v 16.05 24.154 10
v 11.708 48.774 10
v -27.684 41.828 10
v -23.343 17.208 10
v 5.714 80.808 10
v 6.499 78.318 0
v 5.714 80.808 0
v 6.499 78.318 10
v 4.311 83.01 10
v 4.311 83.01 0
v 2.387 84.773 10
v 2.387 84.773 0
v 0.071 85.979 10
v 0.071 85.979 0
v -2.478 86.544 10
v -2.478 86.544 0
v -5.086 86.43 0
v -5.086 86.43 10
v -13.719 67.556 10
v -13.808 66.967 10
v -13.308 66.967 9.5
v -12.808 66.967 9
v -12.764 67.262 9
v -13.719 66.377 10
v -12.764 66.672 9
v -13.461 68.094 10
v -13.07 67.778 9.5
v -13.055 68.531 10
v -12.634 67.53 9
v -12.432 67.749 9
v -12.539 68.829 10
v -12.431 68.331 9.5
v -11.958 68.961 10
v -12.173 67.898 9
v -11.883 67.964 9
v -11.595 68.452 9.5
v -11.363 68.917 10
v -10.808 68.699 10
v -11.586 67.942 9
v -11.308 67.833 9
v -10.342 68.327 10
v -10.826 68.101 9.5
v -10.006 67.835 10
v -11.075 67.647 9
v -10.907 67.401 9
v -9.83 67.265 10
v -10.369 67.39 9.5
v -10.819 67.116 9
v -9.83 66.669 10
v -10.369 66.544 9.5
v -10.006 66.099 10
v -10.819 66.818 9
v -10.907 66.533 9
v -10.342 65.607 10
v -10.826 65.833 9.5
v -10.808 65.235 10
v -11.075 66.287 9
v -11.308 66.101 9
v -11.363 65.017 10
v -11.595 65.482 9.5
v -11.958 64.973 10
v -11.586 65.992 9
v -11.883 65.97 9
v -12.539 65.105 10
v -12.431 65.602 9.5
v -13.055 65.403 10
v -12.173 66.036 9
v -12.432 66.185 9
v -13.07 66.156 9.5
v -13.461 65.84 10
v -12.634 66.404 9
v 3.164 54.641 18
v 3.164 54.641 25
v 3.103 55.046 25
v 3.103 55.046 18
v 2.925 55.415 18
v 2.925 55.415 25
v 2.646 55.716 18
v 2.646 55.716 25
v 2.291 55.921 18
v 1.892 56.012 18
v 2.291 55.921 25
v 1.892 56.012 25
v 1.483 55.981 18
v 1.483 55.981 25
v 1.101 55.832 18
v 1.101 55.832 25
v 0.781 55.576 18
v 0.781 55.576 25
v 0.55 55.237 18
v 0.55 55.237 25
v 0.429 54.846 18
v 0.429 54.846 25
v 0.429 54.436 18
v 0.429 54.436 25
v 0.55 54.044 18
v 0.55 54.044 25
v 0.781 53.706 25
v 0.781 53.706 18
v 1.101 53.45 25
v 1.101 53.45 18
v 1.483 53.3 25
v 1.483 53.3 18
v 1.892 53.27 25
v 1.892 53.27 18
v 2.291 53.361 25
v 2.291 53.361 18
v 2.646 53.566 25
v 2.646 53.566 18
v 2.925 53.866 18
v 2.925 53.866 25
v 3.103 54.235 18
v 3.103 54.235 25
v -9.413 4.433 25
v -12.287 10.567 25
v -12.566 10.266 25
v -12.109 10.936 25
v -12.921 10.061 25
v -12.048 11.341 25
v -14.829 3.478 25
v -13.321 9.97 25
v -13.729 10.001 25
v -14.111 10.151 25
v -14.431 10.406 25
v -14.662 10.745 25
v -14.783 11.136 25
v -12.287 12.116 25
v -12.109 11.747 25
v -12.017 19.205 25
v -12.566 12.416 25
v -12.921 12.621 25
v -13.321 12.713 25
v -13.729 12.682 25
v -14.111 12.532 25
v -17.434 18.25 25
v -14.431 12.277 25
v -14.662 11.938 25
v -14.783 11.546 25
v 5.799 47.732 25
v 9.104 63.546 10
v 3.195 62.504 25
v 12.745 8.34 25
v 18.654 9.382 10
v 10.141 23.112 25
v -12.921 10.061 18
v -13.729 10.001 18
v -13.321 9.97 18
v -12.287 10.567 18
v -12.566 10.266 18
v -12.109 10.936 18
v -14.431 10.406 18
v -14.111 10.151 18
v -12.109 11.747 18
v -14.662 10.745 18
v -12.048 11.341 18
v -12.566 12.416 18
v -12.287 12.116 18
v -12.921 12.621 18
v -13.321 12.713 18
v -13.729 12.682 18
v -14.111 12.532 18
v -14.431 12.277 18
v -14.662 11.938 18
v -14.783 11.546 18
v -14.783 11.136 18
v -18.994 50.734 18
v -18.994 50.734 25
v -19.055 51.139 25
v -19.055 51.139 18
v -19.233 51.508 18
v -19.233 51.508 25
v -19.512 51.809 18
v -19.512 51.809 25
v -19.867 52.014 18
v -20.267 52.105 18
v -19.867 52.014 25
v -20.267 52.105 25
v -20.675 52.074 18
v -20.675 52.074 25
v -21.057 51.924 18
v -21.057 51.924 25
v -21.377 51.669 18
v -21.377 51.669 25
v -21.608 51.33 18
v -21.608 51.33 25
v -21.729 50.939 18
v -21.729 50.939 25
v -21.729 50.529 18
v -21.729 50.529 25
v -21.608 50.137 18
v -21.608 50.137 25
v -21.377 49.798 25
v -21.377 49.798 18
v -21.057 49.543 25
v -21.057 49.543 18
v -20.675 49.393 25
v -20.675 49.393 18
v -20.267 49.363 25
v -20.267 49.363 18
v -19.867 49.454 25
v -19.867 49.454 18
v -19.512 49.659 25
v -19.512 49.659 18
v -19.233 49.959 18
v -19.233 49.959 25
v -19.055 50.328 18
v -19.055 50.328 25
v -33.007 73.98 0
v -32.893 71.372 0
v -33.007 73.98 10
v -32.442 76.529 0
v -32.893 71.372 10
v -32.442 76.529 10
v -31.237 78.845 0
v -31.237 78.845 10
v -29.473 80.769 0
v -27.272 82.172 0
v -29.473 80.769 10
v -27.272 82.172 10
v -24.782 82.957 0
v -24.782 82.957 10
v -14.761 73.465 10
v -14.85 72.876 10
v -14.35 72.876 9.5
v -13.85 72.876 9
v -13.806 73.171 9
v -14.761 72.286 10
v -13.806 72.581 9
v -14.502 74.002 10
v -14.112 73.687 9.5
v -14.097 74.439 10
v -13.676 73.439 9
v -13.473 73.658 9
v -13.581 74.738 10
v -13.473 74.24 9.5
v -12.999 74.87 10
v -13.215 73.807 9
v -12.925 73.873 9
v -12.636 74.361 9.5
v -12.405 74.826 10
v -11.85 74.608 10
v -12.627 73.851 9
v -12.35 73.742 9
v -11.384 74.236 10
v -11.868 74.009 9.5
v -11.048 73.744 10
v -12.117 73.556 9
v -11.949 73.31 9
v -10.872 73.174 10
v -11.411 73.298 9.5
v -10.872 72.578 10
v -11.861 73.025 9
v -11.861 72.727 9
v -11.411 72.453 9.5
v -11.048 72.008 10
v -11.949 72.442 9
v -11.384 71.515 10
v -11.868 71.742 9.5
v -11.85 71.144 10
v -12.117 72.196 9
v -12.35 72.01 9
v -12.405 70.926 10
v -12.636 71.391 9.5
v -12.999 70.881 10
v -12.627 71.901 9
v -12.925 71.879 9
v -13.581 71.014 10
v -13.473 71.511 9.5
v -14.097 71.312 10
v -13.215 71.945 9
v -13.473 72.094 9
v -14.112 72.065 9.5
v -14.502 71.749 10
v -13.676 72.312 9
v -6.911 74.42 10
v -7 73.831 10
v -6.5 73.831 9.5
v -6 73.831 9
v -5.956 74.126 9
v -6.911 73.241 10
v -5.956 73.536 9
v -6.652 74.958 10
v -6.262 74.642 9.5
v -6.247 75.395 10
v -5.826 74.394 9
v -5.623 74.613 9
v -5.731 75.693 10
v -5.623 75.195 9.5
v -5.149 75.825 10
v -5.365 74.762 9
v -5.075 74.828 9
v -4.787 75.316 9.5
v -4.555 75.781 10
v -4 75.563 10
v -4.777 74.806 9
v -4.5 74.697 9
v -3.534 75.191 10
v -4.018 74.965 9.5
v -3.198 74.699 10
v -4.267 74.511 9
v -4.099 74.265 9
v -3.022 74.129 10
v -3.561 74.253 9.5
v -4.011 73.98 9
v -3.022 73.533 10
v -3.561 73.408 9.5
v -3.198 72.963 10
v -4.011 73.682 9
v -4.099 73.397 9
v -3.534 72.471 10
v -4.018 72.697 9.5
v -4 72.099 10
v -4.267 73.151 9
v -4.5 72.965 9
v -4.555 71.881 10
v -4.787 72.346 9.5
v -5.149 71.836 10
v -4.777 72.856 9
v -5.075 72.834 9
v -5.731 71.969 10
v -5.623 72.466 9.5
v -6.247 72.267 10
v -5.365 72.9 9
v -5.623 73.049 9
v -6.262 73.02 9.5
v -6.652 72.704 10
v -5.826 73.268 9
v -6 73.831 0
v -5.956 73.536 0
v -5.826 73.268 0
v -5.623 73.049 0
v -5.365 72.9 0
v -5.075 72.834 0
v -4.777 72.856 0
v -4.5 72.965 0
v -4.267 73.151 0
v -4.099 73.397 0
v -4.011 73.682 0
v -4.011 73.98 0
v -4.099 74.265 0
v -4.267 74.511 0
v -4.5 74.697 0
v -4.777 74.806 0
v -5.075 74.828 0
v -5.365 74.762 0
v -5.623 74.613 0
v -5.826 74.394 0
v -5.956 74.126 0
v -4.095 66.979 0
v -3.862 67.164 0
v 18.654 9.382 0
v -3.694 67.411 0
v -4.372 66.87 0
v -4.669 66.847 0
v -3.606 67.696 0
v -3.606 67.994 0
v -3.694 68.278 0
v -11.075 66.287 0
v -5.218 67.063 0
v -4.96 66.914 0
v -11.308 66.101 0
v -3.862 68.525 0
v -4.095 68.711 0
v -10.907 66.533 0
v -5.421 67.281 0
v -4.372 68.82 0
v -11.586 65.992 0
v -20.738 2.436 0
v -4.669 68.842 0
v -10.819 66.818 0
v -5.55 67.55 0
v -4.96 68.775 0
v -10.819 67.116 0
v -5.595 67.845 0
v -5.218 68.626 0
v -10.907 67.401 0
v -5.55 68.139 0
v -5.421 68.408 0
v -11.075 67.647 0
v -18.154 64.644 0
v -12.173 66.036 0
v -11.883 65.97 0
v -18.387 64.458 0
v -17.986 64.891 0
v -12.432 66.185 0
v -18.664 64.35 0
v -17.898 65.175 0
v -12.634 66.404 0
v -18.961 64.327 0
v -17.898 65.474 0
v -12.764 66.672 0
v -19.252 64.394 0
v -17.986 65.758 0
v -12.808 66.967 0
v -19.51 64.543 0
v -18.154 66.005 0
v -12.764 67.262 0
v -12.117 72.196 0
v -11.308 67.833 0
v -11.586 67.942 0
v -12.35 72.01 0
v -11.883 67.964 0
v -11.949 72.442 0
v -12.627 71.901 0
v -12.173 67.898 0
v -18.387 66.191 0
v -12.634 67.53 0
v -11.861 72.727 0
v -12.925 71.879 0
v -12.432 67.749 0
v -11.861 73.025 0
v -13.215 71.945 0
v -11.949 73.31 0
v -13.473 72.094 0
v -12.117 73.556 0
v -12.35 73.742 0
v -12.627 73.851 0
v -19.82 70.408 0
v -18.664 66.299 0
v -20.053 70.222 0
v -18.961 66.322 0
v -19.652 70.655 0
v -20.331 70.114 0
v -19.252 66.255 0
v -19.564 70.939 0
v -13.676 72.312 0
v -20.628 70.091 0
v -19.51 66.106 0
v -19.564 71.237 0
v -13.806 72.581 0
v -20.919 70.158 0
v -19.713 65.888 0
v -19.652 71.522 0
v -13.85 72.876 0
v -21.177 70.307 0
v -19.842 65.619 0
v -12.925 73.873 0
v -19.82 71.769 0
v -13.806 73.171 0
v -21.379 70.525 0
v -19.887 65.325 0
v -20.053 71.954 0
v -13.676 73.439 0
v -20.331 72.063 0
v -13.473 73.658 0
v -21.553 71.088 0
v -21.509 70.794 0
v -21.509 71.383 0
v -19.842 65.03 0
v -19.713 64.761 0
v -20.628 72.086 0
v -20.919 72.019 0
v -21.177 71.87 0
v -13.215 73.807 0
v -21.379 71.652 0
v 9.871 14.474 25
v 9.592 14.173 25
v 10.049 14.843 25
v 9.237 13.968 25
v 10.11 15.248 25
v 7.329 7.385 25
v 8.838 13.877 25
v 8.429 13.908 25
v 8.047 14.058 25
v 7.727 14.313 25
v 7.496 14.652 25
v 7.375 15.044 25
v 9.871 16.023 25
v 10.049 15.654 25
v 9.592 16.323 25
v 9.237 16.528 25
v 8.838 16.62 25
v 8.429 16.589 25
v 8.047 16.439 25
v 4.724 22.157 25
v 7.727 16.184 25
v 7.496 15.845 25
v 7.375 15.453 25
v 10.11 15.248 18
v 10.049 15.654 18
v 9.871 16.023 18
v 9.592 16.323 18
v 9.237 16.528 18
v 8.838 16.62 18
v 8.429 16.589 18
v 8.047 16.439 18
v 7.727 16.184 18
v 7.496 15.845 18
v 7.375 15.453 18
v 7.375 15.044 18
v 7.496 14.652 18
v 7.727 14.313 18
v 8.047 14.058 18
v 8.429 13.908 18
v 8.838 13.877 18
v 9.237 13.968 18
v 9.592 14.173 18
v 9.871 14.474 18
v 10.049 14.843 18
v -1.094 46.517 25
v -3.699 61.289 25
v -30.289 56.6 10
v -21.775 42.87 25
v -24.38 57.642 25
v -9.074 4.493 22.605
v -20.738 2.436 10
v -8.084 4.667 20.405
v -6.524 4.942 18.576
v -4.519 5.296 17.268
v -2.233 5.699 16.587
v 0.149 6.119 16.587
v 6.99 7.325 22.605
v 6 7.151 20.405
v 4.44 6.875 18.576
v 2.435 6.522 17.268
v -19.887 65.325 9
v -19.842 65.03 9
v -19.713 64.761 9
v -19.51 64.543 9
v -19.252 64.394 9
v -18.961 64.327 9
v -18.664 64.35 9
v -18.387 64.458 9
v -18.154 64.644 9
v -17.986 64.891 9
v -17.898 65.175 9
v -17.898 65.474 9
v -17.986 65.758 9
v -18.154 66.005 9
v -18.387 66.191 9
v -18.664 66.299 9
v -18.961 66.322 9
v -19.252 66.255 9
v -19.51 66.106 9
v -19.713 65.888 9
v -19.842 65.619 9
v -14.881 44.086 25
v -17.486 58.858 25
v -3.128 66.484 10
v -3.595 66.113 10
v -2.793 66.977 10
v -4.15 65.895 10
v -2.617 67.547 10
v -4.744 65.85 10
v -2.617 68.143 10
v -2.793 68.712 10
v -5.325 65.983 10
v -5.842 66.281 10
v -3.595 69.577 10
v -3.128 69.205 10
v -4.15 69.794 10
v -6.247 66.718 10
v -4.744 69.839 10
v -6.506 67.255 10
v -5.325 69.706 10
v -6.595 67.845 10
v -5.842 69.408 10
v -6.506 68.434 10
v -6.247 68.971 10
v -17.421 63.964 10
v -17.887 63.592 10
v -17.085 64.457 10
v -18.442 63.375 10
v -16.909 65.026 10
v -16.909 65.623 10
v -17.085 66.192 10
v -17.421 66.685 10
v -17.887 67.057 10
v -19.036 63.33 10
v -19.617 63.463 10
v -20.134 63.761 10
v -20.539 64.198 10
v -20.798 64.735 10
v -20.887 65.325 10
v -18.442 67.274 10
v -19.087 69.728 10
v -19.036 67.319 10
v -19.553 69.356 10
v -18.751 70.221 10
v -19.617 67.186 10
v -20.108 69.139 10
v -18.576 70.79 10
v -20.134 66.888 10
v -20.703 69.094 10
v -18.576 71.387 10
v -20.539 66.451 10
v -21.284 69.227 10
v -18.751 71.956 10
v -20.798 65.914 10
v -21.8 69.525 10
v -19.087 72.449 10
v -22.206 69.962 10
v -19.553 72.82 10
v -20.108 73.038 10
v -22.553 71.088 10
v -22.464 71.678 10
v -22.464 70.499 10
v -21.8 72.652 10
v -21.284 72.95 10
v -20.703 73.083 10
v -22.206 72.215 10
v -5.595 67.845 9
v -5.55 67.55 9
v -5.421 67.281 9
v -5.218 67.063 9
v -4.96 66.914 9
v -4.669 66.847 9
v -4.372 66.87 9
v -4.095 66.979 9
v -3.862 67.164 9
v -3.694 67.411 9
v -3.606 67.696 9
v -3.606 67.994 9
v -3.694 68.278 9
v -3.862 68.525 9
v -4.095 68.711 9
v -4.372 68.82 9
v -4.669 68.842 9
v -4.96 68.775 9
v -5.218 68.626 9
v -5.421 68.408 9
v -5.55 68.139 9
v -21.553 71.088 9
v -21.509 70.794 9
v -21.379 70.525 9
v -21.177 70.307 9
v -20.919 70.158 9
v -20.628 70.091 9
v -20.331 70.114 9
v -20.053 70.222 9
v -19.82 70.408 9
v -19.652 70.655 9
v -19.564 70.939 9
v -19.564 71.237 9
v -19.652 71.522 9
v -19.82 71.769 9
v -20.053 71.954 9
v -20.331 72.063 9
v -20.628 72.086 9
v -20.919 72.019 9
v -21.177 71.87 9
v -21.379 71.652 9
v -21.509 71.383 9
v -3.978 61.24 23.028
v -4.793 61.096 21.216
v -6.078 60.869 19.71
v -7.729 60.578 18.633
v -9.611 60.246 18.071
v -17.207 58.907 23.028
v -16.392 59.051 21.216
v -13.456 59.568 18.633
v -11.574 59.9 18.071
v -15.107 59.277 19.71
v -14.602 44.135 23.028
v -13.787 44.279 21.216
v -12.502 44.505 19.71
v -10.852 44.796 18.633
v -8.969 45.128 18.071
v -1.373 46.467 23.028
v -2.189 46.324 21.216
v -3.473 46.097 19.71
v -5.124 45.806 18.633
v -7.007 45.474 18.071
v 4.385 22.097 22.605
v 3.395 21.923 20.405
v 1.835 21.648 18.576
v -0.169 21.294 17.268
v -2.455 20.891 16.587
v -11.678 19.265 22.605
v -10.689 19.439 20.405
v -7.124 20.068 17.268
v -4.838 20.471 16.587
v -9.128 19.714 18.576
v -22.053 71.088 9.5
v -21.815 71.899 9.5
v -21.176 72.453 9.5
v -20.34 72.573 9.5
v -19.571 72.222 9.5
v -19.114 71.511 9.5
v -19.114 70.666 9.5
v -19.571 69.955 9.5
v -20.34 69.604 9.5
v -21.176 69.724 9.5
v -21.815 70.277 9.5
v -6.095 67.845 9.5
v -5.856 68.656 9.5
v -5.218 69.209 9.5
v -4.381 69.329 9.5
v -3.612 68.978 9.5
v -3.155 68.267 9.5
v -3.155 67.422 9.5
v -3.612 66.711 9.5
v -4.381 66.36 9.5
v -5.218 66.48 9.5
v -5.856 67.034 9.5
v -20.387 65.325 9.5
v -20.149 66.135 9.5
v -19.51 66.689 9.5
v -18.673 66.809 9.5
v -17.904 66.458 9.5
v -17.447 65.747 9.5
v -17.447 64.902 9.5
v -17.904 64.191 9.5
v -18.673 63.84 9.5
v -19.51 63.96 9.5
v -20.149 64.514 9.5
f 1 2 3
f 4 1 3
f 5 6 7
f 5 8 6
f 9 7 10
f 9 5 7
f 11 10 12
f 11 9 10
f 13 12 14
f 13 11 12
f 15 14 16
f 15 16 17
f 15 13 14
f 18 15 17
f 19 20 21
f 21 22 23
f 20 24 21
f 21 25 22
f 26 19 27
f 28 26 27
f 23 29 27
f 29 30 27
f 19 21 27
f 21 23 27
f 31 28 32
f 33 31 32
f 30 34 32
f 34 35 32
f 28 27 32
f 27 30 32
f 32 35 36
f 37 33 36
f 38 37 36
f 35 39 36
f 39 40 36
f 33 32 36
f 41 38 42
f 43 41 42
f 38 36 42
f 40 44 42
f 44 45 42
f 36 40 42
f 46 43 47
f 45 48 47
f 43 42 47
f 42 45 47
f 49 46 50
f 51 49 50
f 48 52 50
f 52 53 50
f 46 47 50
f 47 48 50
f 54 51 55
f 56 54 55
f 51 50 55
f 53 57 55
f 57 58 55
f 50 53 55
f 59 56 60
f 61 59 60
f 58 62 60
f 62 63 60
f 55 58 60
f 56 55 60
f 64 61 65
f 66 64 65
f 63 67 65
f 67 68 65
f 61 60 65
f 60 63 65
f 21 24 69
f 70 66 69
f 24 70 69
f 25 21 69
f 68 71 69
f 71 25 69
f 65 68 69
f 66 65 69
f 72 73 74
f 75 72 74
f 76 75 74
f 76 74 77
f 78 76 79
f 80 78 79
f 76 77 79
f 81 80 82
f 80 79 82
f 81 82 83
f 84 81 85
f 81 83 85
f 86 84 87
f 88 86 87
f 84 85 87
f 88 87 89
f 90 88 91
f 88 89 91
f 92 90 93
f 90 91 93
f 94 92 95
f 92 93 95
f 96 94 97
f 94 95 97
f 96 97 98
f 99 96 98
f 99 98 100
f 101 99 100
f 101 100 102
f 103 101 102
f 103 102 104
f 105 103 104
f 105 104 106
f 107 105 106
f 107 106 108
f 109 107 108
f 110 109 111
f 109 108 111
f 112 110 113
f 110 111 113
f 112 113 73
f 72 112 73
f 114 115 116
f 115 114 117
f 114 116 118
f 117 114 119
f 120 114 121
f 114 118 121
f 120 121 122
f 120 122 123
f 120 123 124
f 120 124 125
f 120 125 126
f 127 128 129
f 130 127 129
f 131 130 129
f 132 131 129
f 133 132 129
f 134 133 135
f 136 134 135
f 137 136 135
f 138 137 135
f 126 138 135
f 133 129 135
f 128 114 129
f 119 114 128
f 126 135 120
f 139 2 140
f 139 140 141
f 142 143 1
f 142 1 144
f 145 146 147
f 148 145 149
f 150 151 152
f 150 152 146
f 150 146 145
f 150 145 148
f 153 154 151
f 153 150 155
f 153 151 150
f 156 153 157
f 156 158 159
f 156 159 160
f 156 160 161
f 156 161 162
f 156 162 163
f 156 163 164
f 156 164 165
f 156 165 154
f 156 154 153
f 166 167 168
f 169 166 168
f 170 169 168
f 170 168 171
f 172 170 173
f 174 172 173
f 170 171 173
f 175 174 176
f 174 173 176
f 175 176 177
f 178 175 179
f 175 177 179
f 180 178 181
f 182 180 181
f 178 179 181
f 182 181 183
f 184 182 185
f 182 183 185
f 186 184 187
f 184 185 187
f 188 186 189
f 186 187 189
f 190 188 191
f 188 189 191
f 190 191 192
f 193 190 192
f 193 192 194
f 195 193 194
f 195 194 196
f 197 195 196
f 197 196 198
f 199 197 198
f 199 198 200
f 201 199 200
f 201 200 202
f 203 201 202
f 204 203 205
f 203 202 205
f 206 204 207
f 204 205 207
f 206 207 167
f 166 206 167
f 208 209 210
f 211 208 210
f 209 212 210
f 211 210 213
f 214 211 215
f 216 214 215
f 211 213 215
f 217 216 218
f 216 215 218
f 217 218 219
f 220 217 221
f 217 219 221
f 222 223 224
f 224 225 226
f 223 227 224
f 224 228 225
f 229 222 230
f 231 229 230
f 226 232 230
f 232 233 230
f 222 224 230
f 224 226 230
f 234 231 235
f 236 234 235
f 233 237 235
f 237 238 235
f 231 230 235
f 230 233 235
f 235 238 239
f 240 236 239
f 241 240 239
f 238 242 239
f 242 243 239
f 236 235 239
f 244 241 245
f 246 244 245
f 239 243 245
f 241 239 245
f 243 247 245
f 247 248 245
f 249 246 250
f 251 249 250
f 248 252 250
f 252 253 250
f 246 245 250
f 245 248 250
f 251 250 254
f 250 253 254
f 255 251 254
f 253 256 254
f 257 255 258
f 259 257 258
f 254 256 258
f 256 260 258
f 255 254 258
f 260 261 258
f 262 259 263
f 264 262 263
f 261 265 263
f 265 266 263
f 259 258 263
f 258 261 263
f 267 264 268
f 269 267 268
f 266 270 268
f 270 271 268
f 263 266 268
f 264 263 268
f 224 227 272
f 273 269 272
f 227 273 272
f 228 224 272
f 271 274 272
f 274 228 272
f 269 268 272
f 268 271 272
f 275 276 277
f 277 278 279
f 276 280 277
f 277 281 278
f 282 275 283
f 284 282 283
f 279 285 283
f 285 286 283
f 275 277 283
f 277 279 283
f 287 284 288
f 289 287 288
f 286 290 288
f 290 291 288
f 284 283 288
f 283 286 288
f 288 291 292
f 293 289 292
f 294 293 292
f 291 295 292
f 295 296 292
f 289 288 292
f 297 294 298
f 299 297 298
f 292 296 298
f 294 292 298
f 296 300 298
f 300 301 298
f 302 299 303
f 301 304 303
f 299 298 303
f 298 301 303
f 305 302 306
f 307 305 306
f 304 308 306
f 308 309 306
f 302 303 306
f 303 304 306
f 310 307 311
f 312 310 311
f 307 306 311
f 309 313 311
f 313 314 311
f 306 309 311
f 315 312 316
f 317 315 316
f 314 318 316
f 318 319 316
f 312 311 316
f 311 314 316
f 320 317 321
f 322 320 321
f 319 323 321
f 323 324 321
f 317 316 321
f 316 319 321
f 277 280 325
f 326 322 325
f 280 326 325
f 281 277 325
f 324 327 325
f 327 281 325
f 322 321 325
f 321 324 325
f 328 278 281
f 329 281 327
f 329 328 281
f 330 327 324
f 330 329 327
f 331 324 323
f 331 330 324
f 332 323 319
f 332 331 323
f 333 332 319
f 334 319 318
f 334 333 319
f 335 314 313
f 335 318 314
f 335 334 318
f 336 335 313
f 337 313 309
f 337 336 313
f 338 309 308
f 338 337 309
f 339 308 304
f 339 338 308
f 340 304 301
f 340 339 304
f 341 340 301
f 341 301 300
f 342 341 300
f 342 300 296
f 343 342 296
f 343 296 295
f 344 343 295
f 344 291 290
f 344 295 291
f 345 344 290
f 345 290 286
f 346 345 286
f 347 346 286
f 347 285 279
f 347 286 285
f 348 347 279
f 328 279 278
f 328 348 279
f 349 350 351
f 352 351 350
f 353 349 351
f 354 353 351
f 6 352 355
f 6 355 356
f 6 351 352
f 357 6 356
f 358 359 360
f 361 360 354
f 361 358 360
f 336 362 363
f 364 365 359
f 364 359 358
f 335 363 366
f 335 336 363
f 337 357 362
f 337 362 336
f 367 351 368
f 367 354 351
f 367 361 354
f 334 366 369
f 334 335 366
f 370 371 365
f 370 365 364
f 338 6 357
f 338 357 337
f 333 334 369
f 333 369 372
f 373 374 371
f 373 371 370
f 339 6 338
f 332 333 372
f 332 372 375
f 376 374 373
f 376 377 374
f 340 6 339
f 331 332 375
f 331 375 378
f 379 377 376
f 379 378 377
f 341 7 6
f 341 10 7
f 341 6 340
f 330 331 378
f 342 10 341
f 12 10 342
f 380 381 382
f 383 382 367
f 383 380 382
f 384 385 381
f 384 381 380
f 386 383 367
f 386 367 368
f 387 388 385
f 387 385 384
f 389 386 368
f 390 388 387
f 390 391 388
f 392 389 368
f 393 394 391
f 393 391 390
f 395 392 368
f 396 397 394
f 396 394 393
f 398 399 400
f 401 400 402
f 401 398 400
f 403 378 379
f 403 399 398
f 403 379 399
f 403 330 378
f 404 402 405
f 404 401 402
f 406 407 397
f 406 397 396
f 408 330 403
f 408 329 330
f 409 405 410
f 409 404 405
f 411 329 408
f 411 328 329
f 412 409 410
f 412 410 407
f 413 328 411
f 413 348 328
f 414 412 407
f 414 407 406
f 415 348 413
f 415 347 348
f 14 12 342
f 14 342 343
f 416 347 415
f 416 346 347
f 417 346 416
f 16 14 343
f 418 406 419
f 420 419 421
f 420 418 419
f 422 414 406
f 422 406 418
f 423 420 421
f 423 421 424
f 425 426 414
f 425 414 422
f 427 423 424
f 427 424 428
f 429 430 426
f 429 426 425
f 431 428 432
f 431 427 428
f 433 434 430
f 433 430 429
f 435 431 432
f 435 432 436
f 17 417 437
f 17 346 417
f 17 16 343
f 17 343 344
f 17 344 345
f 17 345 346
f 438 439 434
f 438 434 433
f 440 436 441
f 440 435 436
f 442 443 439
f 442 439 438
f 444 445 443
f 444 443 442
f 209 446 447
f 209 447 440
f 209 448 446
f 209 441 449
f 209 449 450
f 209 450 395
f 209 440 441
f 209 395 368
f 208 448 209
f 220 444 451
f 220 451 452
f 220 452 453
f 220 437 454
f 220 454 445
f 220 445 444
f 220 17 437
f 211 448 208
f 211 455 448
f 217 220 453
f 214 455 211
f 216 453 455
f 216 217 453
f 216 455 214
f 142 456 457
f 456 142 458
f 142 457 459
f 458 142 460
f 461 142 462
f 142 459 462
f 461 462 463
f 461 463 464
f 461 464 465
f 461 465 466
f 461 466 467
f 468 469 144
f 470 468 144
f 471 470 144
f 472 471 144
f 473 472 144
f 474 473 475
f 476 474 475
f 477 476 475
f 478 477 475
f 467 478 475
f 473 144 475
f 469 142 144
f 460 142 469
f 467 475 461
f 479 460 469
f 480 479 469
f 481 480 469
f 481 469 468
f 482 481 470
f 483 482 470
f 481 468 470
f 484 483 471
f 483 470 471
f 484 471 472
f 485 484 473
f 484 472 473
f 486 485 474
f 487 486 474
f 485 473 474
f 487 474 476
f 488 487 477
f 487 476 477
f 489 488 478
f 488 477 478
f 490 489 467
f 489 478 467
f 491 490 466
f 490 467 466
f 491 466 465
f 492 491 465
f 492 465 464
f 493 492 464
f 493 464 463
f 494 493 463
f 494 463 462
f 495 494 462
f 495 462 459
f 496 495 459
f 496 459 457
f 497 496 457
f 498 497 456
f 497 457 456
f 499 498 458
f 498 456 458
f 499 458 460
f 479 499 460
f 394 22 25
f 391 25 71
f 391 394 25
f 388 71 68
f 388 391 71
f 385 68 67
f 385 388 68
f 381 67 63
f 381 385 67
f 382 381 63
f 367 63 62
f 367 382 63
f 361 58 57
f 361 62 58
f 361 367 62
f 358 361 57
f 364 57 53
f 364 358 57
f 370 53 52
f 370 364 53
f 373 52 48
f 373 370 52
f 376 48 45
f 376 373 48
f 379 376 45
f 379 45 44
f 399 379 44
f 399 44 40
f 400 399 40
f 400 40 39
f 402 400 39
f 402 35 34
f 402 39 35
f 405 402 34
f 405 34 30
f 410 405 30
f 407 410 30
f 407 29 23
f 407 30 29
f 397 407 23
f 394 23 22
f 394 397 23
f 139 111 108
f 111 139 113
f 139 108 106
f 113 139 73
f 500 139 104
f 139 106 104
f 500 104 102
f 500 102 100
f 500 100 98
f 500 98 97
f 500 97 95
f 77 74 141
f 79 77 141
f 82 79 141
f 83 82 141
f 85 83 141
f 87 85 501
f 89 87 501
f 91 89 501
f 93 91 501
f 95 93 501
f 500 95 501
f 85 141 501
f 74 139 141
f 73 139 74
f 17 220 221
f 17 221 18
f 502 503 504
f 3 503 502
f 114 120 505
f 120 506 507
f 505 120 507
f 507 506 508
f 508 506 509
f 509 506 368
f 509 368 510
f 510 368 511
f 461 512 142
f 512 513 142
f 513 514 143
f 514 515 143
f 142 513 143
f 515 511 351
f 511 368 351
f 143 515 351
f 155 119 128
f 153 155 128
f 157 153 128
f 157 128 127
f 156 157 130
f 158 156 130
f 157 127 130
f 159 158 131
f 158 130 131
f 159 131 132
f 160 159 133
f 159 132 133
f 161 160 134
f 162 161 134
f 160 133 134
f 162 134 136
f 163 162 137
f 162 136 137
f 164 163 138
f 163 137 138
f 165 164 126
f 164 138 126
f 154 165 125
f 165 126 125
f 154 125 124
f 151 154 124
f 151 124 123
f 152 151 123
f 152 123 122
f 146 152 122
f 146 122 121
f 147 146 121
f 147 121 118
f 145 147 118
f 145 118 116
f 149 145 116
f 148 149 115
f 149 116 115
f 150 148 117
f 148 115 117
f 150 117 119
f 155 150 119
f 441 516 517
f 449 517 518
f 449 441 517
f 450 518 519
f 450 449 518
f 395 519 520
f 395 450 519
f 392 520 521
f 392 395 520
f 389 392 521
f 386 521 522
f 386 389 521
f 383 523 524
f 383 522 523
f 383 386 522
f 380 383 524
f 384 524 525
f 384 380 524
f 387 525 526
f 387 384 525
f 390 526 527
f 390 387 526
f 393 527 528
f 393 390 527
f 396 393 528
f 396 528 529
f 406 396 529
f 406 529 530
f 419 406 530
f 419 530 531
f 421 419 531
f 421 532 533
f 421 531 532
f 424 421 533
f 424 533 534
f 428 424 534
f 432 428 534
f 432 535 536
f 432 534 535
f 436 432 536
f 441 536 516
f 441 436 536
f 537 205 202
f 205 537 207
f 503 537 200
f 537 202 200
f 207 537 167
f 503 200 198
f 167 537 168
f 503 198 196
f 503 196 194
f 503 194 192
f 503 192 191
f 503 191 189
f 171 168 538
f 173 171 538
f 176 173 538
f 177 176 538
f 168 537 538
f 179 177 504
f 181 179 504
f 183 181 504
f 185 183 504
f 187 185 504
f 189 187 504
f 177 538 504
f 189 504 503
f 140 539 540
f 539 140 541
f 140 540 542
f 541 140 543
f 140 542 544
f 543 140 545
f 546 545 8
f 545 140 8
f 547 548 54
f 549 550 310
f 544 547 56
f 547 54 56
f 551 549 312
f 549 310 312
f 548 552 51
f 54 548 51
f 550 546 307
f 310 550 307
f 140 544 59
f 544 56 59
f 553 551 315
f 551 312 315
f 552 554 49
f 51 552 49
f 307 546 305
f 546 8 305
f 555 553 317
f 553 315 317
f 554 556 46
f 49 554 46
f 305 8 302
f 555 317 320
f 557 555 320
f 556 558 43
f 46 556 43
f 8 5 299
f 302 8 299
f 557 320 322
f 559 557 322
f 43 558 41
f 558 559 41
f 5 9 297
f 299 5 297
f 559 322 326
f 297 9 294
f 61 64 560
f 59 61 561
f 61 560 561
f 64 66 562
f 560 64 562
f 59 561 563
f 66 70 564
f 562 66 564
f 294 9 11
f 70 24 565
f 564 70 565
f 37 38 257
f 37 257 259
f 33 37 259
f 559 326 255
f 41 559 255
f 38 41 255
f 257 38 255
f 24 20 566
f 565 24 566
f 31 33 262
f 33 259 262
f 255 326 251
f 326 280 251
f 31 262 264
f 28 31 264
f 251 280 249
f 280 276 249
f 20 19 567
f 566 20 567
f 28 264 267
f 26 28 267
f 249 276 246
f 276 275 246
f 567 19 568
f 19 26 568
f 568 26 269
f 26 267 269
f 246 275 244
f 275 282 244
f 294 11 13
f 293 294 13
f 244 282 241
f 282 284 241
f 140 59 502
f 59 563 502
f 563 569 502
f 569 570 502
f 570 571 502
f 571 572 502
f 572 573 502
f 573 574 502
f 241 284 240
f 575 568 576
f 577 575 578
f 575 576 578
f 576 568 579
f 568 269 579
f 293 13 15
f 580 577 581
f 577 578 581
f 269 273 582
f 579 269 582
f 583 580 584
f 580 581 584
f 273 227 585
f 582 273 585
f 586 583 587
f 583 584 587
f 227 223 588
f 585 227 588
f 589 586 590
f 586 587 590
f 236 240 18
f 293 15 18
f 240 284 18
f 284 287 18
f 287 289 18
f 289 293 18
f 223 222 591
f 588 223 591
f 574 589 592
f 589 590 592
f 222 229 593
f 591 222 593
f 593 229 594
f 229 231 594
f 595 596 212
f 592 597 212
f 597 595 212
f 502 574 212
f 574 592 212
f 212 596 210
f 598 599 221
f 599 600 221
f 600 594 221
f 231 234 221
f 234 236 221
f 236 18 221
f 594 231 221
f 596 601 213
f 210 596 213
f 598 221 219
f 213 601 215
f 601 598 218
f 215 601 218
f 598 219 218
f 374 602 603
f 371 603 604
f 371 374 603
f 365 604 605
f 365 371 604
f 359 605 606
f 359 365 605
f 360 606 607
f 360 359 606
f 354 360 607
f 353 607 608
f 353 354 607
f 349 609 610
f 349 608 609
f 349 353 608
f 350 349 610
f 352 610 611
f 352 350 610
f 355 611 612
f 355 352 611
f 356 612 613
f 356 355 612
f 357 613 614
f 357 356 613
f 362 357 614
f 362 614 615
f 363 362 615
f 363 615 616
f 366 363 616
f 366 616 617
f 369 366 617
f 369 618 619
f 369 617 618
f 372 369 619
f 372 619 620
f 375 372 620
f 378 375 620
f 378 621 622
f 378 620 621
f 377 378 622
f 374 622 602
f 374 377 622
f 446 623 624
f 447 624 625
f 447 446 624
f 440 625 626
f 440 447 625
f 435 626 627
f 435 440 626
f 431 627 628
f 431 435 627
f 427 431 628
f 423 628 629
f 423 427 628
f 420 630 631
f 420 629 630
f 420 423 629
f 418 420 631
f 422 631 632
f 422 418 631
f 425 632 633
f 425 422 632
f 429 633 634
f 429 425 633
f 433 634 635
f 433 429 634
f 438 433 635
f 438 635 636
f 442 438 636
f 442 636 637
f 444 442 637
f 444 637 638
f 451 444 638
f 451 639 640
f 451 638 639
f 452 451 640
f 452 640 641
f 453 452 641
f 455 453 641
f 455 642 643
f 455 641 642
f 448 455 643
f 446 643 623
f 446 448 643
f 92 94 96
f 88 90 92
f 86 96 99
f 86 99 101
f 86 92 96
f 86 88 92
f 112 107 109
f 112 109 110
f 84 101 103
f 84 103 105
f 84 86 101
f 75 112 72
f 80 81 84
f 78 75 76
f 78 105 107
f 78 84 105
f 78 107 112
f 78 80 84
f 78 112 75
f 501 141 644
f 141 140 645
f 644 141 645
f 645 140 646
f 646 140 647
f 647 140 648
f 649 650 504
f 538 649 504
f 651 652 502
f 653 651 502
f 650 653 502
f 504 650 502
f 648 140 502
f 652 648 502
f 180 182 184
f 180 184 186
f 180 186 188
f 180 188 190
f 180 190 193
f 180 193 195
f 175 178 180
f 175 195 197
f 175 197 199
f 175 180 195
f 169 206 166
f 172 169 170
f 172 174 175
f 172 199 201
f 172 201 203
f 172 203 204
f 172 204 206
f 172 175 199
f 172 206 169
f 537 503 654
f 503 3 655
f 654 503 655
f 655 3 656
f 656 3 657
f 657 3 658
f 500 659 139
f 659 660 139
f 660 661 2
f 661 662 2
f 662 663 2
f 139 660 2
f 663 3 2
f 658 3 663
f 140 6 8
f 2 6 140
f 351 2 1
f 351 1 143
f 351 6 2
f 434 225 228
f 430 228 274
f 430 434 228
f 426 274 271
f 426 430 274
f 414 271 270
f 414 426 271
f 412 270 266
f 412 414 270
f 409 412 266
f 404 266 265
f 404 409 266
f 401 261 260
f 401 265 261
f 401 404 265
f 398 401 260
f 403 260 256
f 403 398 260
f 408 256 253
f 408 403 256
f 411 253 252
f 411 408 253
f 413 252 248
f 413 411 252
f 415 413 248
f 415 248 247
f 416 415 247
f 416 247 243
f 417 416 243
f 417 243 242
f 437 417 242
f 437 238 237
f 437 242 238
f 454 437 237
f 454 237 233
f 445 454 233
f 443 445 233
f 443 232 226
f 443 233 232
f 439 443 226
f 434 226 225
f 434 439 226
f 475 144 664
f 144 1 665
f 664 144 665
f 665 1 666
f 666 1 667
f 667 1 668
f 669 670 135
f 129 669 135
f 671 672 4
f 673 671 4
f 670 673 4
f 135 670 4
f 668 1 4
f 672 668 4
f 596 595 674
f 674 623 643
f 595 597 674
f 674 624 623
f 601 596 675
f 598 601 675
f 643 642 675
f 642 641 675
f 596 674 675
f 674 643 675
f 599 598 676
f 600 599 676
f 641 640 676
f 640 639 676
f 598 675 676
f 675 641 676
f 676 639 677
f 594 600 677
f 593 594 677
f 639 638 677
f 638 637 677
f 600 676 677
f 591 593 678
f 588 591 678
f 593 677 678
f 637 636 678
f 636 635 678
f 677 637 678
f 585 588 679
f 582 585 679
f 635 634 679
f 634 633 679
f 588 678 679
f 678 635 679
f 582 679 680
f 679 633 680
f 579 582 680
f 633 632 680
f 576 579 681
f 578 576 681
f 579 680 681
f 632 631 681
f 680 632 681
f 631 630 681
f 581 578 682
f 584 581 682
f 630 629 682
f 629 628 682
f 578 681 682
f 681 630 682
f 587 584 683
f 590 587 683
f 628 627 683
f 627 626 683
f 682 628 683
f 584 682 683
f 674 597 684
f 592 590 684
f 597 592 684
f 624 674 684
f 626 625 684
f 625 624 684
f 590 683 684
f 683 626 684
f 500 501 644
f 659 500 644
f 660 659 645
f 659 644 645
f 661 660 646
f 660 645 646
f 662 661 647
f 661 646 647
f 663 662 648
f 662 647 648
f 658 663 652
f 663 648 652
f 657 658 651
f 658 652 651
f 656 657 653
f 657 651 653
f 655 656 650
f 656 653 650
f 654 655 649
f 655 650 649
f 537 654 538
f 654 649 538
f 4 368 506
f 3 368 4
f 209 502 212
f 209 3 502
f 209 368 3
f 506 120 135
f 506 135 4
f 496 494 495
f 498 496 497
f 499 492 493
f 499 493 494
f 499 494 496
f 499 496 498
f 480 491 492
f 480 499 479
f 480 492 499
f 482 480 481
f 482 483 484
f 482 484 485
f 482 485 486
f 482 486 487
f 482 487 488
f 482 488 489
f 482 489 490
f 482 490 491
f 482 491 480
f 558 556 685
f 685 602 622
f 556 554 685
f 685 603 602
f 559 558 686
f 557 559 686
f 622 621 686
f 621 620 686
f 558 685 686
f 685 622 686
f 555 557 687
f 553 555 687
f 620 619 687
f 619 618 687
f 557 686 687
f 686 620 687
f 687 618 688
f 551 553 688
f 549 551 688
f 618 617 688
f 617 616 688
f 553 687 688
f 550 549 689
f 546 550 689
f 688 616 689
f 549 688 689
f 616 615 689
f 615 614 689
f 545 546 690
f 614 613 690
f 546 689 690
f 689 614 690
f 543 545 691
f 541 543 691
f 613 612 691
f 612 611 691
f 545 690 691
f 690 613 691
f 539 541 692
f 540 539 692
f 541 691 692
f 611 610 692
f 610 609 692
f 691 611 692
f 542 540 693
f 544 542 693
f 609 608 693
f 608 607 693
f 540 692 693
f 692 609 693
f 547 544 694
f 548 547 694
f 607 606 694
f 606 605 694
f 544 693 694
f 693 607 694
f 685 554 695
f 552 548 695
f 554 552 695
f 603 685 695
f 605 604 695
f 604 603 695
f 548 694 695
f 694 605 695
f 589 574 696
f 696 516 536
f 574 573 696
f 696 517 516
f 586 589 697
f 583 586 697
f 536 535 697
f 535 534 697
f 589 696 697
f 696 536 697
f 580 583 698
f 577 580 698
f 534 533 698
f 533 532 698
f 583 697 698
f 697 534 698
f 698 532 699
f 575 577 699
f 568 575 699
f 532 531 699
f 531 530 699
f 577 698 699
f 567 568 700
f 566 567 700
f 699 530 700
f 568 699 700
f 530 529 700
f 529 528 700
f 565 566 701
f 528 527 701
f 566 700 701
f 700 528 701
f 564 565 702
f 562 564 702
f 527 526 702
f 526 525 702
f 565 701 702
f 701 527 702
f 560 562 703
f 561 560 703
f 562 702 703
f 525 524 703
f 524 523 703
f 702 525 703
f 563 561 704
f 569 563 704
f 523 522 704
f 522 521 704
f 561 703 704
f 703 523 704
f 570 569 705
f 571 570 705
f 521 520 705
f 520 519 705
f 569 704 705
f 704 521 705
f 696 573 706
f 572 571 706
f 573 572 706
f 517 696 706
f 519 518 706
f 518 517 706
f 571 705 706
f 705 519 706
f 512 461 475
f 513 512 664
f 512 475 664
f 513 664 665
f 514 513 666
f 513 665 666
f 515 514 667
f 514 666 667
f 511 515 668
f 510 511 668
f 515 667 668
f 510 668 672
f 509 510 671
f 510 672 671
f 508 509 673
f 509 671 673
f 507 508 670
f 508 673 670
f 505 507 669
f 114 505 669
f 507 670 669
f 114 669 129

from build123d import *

# Parameters (mm, degrees)
BOSS_EXTRUDE7_DEPTH     = 10
SKETCH1_9_R             = 1
CUT_EXTRUDE4_DEPTH      = 19
CHAMFER1_SIZE           = 1
BOSS_EXTRUDE8_DEPTH     = 30
CUT_EXTRUDE7_DEPTH      = 42
CUT_EXTRUDE7_DEPTH_BACK = 39
CUT_EXTRUDE8_DEPTH      = 24
CUT_EXTRUDE9_DEPTH      = 24
SKETCH10_R              = 1.375
CUT_EXTRUDE10_DEPTH     = 7
FILLET1_R               = 10


with BuildPart() as part:
    # Sketch1 → Boss-Extrude7 (new body)
    with BuildSketch(Plane.XY):
        Polygon((-34.62989834, 81.220503206), (4.762411781, 88.166430312), (18.654265994, 9.381810071), (-20.738044126, 2.435882965), align=None)
    extrude(amount=BOSS_EXTRUDE7_DEPTH)

    # Sketch1<9> → Cut-Extrude4 (cut)
    with BuildSketch(Plane.XY):
        with Locations((-20.553187739, 71.088441211)):
            Circle(SKETCH1_9_R)
        with Locations((-5, 73.830887845)):
            Circle(SKETCH1_9_R)
        with Locations((-18.886713057, 65.324513545)):
            Circle(SKETCH1_9_R)
        with Locations((-4.594594595, 67.844599641)):
            Circle(SKETCH1_9_R)
        with Locations((-12.849965147, 72.875773723)):
            Circle(SKETCH1_9_R)
        with Locations((-11.808076081, 66.966927205)):
            Circle(SKETCH1_9_R)
    extrude(amount=CUT_EXTRUDE4_DEPTH, mode=Mode.SUBTRACT)

    # Chamfer1
    chamfer1_edges = [part.edges().sort_by_distance(p)[0] for p in [
        (-19.886713057, 65.324513545, 10),
        (-5.594594595, 67.844599641, 10),
        (-6, 73.830887845, 10),
        (-21.553187739, 71.088441211, 10),
        (-12.808076081, 66.966927205, 10),
        (-13.849965147, 72.875773723, 10),
    ]]
    chamfer(chamfer1_edges, length=CHAMFER1_SIZE)

    # Sketch6 → Boss-Extrude8 (add)
    with BuildSketch(Plane.XY.offset(10)):
        Polygon((16.049543329, 24.153926367), (-23.342766791, 17.20799926), (-20.738044126, 2.435882965), (18.654265994, 9.381810071), align=None)
        Polygon((-30.288693898, 56.60030938), (-27.683971233, 41.828193085), (11.708338888, 48.774120192), (9.103616223, 63.546236487), align=None)
    extrude(amount=BOSS_EXTRUDE8_DEPTH)

    # Sketch8 → Cut-Extrude7 (cut, two sides: drawn at the far end of the back side and taken through both)
    with BuildSketch(Plane(origin=(-3.646611731, 20.680962813, 0), x_dir=(0.984807753012227, 0.1736481776668232, 0), z_dir=(-0.1736481776668232, 0.984807753012227, 0)).offset(-CUT_EXTRUDE7_DEPTH_BACK)):
        Polygon((-14, -40), (-14, -25), (-20, -10), (-20, -40), align=None)
        Polygon((20, -10), (14, -25), (14, -40), (20, -40), align=None)
    extrude(amount=CUT_EXTRUDE7_DEPTH + CUT_EXTRUDE7_DEPTH_BACK, mode=Mode.SUBTRACT)

    # Sketch8<4> → Cut-Extrude8 (cut)
    with BuildSketch(Plane(origin=(-3.646611731, 20.680962813, 0), x_dir=(0.984807753012227, 0.1736481776668232, 0), z_dir=(-0.1736481776668232, 0.984807753012227, 0))):
        with BuildLine():
            Line((14, -25), (8.5, -25))
            ThreePointArc((8.5, -25), (0, -16.5), (-8.5, -25))
            Line((-8.5, -25), (-14, -25))
            Line((-14, -25), (-14, -40))
            Line((-14, -40), (14, -40))
            Line((14, -40), (14, -25))
        make_face()
    extrude(amount=-CUT_EXTRUDE8_DEPTH, mode=Mode.SUBTRACT)

    # Sketch7 → Cut-Extrude9 (cut)
    with BuildSketch(Plane(origin=(-10.592538838, 60.073272934, 0), x_dir=(0.984807753012227, 0.17364817766682317, 0), z_dir=(-0.17364817766682317, 0.984807753012227, 0))):
        with BuildLine():
            Line((20, -40), (20, -10))
            Line((20, -10), (14, -25))
            Line((14, -25), (7, -25))
            ThreePointArc((7, -25), (0, -18), (-7, -25))
            Line((-7, -25), (-14, -25))
            Line((-14, -25), (-20, -10))
            Line((-20, -10), (-20, -40))
            Line((-20, -40), (20, -40))
        make_face()
    extrude(amount=-CUT_EXTRUDE9_DEPTH, mode=Mode.SUBTRACT)

    # Sketch10 → Cut-Extrude10 (cut)
    with BuildSketch(Plane.XY.offset(25)):
        with Locations((-13.42333762, 11.341362667)):
            Circle(SKETCH10_R)
        with Locations((8.734836823, 15.248446664)):
            Circle(SKETCH10_R)
        with Locations((-20.369264727, 50.733672787)):
            Circle(SKETCH10_R)
        with Locations((1.788909716, 54.640756785)):
            Circle(SKETCH10_R)
    extrude(amount=-CUT_EXTRUDE10_DEPTH, mode=Mode.SUBTRACT)

    # Fillet1
    fillet1_edges = [part.edges().sort_by_distance(p)[0] for p in [
        (4.762411781, 88.166430312, 5),
        (-34.62989834, 81.220503206, 5),
    ]]
    fillet(fillet1_edges, radius=FILLET1_R)


solid = part.part
